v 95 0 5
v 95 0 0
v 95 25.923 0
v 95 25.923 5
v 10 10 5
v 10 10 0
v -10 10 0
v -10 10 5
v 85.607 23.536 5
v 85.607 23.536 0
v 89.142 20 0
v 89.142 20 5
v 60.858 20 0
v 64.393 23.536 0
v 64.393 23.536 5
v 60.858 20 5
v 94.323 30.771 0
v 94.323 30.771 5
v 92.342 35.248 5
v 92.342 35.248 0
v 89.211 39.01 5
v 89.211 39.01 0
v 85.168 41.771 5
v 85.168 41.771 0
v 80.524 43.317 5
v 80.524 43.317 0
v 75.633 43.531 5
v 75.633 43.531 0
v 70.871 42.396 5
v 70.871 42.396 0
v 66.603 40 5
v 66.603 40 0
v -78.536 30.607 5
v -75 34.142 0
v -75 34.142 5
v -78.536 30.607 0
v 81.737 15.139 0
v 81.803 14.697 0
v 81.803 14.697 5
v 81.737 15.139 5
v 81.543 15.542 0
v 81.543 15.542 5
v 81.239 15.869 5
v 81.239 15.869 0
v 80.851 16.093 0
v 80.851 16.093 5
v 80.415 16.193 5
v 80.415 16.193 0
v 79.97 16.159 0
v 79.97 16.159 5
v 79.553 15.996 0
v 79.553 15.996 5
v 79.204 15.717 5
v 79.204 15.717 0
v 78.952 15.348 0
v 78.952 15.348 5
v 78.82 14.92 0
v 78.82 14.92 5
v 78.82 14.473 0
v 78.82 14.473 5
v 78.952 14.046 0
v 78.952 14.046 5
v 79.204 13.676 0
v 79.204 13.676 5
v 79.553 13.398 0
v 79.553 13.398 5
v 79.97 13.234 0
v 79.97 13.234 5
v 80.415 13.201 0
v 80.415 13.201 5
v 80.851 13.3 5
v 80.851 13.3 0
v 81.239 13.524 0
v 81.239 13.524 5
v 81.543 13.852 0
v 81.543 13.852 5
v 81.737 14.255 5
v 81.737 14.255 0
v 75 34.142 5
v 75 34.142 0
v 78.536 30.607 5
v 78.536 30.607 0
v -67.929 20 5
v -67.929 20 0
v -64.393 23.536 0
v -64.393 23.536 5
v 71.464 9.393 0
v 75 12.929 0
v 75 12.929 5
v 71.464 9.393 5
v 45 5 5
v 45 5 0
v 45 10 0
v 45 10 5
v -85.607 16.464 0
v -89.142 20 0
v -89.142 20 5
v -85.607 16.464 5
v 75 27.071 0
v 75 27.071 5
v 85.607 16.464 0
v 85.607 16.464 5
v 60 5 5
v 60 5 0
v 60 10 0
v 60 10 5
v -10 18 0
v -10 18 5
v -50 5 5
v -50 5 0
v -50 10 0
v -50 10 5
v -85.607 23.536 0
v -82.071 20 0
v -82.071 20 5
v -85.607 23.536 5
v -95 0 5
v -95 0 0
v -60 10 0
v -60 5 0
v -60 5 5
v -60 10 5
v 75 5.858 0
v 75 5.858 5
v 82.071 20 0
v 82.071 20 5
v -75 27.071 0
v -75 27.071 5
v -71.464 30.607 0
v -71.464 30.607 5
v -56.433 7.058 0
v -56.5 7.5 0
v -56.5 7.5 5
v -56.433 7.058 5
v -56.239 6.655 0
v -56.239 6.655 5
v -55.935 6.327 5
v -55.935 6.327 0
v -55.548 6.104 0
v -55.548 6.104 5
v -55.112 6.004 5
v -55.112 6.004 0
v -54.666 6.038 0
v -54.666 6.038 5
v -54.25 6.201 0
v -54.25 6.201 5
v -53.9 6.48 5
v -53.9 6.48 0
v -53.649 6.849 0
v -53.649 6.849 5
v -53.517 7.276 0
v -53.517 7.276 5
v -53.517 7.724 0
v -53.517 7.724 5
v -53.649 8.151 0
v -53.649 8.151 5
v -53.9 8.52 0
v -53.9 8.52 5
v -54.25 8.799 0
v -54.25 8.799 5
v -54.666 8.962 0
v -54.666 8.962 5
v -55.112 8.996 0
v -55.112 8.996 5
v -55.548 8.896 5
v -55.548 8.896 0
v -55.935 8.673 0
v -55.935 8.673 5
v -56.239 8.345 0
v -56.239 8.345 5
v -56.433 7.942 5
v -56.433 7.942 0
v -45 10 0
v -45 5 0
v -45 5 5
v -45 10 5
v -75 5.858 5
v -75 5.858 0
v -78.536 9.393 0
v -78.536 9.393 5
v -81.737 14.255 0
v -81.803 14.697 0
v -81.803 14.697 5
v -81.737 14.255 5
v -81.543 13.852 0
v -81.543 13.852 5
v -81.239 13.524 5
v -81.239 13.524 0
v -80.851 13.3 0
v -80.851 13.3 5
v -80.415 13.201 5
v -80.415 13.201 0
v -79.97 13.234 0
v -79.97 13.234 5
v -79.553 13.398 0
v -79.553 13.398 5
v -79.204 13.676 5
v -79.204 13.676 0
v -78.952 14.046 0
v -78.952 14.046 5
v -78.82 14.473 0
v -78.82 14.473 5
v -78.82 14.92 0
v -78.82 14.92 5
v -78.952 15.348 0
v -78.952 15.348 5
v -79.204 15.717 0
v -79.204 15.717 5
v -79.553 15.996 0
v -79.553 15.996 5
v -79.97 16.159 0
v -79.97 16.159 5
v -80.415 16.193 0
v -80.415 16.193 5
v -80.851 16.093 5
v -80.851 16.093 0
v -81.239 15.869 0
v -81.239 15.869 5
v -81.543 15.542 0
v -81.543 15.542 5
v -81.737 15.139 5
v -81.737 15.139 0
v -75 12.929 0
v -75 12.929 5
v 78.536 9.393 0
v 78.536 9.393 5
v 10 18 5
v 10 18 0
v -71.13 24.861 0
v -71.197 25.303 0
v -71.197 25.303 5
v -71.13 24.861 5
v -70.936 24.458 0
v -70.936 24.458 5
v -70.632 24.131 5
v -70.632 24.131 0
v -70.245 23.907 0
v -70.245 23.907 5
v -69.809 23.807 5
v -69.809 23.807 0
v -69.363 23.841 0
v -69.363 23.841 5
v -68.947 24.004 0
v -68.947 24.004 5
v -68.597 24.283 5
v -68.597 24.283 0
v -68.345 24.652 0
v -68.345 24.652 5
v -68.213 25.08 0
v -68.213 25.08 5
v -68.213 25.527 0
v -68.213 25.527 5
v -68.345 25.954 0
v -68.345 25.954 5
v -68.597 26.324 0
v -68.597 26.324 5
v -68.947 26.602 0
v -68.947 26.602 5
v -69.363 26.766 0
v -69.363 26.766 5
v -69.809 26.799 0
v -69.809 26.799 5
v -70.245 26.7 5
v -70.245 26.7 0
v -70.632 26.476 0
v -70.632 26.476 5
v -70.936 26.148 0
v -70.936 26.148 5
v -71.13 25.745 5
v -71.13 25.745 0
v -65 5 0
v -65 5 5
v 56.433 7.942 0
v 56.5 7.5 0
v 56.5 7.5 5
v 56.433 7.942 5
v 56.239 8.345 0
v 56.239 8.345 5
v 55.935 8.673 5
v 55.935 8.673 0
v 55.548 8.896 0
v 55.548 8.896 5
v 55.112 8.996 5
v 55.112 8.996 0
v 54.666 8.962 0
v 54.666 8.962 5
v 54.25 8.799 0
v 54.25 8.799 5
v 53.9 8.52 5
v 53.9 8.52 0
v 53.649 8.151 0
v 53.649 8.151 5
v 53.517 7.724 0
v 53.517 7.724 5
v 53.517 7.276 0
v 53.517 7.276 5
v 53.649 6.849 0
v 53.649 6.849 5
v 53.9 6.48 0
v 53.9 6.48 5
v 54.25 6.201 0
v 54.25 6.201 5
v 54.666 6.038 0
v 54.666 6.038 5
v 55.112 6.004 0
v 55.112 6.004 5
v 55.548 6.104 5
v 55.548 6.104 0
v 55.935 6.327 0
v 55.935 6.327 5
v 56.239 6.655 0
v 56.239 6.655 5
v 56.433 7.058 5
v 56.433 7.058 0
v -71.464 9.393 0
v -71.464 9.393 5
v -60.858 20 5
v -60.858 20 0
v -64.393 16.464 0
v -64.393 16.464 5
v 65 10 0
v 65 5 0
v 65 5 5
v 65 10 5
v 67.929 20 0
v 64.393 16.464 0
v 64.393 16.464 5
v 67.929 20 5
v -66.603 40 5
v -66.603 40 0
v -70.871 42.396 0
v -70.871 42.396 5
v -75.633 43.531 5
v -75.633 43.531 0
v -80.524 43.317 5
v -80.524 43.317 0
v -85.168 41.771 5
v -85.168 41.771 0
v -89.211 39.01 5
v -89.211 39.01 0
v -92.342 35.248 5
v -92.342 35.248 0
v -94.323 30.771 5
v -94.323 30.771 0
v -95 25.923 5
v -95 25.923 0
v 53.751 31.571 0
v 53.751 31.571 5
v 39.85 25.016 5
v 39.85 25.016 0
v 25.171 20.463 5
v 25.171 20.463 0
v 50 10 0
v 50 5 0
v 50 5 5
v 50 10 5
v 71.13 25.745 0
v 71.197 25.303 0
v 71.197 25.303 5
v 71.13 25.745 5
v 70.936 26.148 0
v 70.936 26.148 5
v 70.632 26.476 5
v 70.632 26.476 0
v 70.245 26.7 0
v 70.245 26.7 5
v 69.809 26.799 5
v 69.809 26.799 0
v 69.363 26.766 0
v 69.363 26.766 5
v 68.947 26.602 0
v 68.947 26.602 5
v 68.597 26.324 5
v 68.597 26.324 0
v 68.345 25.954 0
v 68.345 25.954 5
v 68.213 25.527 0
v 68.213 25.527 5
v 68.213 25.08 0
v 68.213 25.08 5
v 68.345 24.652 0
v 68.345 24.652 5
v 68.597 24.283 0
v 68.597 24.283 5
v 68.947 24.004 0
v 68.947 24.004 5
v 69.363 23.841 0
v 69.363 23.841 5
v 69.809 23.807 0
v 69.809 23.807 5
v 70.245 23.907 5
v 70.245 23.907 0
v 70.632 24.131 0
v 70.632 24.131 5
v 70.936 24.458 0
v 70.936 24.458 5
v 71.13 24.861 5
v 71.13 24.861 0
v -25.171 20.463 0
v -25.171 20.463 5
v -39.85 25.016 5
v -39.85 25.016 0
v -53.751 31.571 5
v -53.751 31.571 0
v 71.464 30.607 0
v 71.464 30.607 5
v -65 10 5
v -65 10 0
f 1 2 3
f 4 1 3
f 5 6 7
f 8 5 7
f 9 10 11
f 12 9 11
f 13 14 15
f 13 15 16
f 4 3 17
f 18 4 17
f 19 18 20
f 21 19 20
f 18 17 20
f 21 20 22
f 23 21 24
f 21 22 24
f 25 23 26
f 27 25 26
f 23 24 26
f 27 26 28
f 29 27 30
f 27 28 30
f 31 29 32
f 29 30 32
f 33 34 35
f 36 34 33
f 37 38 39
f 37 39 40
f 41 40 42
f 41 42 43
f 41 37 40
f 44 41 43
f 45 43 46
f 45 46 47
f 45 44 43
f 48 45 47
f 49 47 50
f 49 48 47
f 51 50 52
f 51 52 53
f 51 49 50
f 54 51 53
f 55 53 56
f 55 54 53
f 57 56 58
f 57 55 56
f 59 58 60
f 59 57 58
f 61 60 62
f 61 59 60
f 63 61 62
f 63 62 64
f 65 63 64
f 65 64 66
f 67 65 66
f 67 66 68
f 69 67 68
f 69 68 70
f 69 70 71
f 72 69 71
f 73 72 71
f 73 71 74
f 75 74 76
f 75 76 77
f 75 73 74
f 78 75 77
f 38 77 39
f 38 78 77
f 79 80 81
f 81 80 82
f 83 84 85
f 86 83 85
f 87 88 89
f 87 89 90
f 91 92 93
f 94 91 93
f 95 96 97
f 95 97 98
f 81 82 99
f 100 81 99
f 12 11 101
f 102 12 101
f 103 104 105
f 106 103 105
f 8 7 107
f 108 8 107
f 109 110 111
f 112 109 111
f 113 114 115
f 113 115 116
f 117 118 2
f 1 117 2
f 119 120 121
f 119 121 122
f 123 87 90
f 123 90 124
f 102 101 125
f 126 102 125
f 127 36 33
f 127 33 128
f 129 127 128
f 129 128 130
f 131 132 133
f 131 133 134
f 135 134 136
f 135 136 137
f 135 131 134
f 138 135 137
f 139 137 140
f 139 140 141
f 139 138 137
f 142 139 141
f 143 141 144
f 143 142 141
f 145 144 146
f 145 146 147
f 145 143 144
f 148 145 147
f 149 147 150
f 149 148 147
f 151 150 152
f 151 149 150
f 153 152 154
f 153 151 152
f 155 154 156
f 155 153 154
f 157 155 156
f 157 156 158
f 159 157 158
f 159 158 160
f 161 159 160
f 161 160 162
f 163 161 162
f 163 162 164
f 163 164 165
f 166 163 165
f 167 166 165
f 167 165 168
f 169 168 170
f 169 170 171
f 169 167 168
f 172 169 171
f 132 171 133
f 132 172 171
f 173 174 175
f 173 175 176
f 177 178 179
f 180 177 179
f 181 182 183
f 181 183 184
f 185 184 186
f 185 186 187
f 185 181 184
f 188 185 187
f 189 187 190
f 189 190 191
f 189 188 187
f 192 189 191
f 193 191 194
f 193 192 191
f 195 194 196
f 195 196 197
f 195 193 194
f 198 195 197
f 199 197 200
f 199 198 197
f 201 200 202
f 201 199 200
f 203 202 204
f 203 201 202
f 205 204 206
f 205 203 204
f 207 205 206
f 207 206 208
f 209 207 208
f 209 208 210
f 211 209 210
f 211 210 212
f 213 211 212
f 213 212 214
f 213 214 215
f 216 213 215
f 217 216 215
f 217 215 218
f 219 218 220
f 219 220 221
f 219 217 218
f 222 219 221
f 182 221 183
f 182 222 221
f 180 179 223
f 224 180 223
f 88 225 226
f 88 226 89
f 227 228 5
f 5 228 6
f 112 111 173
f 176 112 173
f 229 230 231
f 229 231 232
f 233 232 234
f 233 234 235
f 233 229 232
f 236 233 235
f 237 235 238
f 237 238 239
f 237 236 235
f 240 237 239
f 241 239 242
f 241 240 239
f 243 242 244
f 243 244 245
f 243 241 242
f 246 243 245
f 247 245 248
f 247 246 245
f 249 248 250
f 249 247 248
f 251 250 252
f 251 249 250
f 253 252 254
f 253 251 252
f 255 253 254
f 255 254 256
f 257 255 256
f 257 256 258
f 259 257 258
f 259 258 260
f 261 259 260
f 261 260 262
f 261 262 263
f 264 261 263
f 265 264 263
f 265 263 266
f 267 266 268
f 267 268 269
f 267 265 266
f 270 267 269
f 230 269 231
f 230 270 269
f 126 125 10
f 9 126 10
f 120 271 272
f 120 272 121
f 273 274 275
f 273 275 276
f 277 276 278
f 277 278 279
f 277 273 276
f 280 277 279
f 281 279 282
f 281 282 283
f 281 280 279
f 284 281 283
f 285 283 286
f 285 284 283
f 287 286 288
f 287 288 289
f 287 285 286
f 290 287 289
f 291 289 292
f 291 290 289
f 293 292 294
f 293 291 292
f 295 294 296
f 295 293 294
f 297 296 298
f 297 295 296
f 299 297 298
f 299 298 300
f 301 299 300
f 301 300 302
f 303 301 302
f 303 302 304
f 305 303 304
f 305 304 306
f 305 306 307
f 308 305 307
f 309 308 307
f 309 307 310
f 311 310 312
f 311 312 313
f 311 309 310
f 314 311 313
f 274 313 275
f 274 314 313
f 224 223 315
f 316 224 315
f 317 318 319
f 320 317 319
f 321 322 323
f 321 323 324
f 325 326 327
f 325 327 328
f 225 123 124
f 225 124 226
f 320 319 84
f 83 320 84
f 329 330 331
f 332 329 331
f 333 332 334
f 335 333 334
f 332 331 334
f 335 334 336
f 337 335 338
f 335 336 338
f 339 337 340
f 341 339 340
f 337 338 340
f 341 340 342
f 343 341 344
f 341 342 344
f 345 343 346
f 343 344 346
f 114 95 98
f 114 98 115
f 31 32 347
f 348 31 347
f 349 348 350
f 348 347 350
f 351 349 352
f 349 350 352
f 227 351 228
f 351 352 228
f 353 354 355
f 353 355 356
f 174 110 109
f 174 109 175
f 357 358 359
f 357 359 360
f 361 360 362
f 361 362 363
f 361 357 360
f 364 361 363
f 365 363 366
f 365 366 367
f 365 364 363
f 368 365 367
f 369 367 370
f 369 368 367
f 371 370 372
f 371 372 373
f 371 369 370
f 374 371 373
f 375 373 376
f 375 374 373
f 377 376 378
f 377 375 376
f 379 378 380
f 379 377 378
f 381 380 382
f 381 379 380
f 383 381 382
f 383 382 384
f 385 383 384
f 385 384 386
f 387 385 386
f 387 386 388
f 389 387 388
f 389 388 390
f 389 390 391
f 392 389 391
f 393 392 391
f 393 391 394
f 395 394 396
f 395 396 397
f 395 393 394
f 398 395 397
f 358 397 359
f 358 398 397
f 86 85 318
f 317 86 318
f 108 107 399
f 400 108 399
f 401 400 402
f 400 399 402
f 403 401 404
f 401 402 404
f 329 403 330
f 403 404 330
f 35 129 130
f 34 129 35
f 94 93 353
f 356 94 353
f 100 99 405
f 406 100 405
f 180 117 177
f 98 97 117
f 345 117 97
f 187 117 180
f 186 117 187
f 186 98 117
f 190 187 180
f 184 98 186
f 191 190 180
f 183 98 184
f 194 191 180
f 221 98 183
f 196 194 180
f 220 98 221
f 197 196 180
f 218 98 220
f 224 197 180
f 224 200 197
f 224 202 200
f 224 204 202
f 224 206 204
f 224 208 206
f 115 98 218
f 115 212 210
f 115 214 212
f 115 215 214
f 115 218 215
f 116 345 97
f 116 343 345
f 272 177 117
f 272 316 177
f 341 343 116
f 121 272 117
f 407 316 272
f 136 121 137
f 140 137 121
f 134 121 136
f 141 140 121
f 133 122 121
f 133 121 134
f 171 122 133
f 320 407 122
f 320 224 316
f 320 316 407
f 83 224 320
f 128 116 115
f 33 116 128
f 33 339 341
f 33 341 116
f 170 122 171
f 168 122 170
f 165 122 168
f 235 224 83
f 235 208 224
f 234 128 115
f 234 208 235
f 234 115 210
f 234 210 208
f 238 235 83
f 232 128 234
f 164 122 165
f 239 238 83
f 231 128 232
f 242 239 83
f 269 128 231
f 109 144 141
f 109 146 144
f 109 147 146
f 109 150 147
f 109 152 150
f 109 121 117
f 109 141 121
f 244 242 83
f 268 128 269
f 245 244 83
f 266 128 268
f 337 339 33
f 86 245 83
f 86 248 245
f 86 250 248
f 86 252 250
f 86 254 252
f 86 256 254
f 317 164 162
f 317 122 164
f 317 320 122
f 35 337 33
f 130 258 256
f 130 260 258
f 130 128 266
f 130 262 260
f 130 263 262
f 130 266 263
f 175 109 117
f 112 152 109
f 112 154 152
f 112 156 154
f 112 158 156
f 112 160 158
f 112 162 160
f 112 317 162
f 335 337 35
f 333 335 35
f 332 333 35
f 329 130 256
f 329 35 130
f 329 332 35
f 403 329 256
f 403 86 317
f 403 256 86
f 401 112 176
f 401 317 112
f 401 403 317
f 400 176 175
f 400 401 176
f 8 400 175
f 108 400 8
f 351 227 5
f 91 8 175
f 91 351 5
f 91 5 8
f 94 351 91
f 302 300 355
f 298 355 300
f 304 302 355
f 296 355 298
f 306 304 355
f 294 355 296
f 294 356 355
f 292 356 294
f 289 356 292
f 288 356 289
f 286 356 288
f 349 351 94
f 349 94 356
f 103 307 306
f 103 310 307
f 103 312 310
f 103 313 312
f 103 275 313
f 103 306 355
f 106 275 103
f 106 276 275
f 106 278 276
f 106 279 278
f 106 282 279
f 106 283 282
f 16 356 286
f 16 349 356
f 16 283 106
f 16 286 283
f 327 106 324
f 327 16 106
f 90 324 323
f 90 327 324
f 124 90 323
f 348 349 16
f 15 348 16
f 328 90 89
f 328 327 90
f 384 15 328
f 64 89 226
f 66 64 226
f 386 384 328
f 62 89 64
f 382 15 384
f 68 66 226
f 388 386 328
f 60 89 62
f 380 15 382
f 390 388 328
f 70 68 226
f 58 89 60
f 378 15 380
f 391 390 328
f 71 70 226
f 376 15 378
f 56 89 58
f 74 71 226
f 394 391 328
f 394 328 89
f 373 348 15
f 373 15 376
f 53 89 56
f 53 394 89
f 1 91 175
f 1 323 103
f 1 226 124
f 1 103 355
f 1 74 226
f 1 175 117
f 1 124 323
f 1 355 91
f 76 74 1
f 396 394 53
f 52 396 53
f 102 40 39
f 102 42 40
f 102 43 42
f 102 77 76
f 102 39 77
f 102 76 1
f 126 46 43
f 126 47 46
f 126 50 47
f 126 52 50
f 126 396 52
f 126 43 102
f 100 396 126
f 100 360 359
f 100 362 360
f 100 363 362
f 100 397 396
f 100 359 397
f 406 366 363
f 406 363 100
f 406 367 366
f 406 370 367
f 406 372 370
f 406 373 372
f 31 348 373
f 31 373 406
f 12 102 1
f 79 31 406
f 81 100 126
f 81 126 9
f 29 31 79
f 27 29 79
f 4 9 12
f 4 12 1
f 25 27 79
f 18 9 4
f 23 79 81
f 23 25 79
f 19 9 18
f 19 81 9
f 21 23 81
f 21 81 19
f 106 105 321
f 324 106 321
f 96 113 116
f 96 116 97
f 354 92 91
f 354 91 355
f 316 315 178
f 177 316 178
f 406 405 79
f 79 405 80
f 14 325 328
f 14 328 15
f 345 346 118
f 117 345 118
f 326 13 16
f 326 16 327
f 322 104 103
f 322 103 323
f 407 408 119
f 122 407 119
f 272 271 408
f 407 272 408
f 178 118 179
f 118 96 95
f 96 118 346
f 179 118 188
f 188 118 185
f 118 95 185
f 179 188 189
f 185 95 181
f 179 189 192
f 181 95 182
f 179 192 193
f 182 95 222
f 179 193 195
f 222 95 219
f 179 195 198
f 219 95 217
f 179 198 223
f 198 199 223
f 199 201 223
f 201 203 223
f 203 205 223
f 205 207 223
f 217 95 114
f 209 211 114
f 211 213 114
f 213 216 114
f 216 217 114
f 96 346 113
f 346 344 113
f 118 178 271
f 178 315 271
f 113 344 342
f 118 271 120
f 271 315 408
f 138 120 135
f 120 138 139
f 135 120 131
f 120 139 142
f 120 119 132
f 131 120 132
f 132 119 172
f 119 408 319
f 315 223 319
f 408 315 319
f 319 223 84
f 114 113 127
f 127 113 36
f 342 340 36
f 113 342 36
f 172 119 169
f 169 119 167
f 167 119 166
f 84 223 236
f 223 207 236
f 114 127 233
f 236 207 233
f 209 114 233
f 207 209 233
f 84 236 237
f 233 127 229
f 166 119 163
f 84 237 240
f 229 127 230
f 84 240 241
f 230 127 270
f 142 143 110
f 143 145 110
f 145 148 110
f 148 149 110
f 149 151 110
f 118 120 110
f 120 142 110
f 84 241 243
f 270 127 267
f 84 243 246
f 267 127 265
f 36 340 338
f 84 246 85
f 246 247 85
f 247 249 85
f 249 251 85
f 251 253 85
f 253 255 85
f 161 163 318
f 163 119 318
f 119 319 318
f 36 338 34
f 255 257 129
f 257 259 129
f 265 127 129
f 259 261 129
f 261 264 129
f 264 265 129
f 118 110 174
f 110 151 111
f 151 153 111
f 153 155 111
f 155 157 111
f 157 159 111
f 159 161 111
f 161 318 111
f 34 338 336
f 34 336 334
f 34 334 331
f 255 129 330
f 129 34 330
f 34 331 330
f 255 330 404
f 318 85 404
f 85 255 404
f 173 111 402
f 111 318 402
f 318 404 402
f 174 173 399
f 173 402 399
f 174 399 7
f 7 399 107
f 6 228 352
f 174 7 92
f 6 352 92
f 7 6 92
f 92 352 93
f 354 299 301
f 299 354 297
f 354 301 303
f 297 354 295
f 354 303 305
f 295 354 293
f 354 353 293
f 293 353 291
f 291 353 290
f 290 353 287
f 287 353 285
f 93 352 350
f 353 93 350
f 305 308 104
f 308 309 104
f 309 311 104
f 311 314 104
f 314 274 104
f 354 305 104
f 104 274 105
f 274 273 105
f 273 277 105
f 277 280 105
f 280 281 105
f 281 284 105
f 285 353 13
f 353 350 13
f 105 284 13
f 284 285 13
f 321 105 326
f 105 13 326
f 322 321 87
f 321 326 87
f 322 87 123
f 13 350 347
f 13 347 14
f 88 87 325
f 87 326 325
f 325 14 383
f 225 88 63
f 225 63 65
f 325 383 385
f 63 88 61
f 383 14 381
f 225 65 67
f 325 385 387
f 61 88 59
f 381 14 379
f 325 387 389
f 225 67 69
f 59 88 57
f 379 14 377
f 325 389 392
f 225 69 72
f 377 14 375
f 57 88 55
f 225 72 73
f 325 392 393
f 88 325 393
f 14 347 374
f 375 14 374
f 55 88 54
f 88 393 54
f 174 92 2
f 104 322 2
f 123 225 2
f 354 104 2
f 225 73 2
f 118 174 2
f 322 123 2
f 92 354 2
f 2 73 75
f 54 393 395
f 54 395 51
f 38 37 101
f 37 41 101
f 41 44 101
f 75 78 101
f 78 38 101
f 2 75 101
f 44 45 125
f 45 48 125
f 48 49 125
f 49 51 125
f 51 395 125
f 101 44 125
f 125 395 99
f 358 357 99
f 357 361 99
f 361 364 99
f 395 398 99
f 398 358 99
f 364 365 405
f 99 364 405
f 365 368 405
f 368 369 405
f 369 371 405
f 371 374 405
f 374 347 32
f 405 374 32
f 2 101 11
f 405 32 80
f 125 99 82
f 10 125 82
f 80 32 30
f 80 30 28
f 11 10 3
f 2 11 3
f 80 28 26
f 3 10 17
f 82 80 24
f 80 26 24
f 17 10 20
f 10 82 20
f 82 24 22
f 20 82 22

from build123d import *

# Parameters (mm, degrees)
SKETCH1_R           = 1.5
SKETCH1_W           = 5
SKETCH1_H           = 5
BOSS_EXTRUDE1_DEPTH = 5


with BuildPart() as part:
    # Sketch1 → Boss-Extrude1 (new body)
    with BuildSketch(Plane.XY):
        with BuildLine():
            Line((-95, 0), (95, 0))
            Line((95, 0), (95, 25.923215718))
            ThreePointArc((95, 25.923215718), (85.16818484, 41.770502039), (66.60299172, 40))
            ThreePointArc((66.60299172, 40), (39.84977522, 25.016488918), (10, 18))
            Line((10, 18), (10, 10))
            Line((10, 10), (-10, 10))
            Line((-10, 10), (-10, 18))
            ThreePointArc((-10, 18), (-39.84977522, 25.016488918), (-66.60299172, 40))
            ThreePointArc((-66.60299172, 40), (-85.16818484, 41.770502039), (-95, 25.923215718))
            Line((-95, 25.923215718), (-95, 0))
        make_face()
        with Locations((80.303300859, 14.696699141)):
            Circle(SKETCH1_R, mode=Mode.SUBTRACT)
        with Locations((69.696699141, 25.303300859)):
            Circle(SKETCH1_R, mode=Mode.SUBTRACT)
        with Locations(Location((-69.696699141, 25.303300859, 0), (0, 0, 180))):
            Circle(SKETCH1_R, mode=Mode.SUBTRACT)
        with Locations(Location((-80.303300859, 14.696699141, 0), (0, 0, 180))):
            Circle(SKETCH1_R, mode=Mode.SUBTRACT)
        with Locations((55, 7.5)):
            Circle(SKETCH1_R, mode=Mode.SUBTRACT)
        with Locations(Location((-55, 7.5, 0), (0, 0, 180))):
            Circle(SKETCH1_R, mode=Mode.SUBTRACT)
        Polygon((75, 12.928932188), (71.464466094, 9.393398282), (75, 5.857864376), (78.535533906, 9.393398282), align=None, mode=Mode.SUBTRACT)
        Polygon((82.071067812, 20), (85.606601718, 23.535533906), (89.142135624, 20), (85.606601718, 16.464466094), align=None, mode=Mode.SUBTRACT)
        Polygon((64.393398282, 23.535533906), (60.857864376, 20), (64.393398282, 16.464466094), (67.928932188, 20), align=None, mode=Mode.SUBTRACT)
        Polygon((71.464466094, 30.606601718), (75, 34.142135624), (78.535533906, 30.606601718), (75, 27.071067812), align=None, mode=Mode.SUBTRACT)
        Polygon((-64.393398282, 23.535533906), (-60.857864376, 20), (-64.393398282, 16.464466094), (-67.928932188, 20), align=None, mode=Mode.SUBTRACT)
        Polygon((-71.464466094, 30.606601718), (-75, 34.142135624), (-78.535533906, 30.606601718), (-75, 27.071067812), align=None, mode=Mode.SUBTRACT)
        Polygon((-75, 12.928932188), (-71.464466094, 9.393398282), (-75, 5.857864376), (-78.535533906, 9.393398282), align=None, mode=Mode.SUBTRACT)
        Polygon((-82.071067812, 20), (-85.606601718, 23.535533906), (-89.142135624, 20), (-85.606601718, 16.464466094), align=None, mode=Mode.SUBTRACT)
        with Locations((47.5, 7.5)):
            Rectangle(SKETCH1_W, SKETCH1_H, mode=Mode.SUBTRACT)
        with Locations((62.5, 7.5)):
            Rectangle(SKETCH1_W, SKETCH1_H, mode=Mode.SUBTRACT)
        with Locations((-47.5, 7.5)):
            Rectangle(SKETCH1_W, SKETCH1_H, mode=Mode.SUBTRACT)
        with Locations((-62.5, 7.5)):
            Rectangle(SKETCH1_W, SKETCH1_H, mode=Mode.SUBTRACT)
    extrude(amount=BOSS_EXTRUDE1_DEPTH)


solid = part.part
